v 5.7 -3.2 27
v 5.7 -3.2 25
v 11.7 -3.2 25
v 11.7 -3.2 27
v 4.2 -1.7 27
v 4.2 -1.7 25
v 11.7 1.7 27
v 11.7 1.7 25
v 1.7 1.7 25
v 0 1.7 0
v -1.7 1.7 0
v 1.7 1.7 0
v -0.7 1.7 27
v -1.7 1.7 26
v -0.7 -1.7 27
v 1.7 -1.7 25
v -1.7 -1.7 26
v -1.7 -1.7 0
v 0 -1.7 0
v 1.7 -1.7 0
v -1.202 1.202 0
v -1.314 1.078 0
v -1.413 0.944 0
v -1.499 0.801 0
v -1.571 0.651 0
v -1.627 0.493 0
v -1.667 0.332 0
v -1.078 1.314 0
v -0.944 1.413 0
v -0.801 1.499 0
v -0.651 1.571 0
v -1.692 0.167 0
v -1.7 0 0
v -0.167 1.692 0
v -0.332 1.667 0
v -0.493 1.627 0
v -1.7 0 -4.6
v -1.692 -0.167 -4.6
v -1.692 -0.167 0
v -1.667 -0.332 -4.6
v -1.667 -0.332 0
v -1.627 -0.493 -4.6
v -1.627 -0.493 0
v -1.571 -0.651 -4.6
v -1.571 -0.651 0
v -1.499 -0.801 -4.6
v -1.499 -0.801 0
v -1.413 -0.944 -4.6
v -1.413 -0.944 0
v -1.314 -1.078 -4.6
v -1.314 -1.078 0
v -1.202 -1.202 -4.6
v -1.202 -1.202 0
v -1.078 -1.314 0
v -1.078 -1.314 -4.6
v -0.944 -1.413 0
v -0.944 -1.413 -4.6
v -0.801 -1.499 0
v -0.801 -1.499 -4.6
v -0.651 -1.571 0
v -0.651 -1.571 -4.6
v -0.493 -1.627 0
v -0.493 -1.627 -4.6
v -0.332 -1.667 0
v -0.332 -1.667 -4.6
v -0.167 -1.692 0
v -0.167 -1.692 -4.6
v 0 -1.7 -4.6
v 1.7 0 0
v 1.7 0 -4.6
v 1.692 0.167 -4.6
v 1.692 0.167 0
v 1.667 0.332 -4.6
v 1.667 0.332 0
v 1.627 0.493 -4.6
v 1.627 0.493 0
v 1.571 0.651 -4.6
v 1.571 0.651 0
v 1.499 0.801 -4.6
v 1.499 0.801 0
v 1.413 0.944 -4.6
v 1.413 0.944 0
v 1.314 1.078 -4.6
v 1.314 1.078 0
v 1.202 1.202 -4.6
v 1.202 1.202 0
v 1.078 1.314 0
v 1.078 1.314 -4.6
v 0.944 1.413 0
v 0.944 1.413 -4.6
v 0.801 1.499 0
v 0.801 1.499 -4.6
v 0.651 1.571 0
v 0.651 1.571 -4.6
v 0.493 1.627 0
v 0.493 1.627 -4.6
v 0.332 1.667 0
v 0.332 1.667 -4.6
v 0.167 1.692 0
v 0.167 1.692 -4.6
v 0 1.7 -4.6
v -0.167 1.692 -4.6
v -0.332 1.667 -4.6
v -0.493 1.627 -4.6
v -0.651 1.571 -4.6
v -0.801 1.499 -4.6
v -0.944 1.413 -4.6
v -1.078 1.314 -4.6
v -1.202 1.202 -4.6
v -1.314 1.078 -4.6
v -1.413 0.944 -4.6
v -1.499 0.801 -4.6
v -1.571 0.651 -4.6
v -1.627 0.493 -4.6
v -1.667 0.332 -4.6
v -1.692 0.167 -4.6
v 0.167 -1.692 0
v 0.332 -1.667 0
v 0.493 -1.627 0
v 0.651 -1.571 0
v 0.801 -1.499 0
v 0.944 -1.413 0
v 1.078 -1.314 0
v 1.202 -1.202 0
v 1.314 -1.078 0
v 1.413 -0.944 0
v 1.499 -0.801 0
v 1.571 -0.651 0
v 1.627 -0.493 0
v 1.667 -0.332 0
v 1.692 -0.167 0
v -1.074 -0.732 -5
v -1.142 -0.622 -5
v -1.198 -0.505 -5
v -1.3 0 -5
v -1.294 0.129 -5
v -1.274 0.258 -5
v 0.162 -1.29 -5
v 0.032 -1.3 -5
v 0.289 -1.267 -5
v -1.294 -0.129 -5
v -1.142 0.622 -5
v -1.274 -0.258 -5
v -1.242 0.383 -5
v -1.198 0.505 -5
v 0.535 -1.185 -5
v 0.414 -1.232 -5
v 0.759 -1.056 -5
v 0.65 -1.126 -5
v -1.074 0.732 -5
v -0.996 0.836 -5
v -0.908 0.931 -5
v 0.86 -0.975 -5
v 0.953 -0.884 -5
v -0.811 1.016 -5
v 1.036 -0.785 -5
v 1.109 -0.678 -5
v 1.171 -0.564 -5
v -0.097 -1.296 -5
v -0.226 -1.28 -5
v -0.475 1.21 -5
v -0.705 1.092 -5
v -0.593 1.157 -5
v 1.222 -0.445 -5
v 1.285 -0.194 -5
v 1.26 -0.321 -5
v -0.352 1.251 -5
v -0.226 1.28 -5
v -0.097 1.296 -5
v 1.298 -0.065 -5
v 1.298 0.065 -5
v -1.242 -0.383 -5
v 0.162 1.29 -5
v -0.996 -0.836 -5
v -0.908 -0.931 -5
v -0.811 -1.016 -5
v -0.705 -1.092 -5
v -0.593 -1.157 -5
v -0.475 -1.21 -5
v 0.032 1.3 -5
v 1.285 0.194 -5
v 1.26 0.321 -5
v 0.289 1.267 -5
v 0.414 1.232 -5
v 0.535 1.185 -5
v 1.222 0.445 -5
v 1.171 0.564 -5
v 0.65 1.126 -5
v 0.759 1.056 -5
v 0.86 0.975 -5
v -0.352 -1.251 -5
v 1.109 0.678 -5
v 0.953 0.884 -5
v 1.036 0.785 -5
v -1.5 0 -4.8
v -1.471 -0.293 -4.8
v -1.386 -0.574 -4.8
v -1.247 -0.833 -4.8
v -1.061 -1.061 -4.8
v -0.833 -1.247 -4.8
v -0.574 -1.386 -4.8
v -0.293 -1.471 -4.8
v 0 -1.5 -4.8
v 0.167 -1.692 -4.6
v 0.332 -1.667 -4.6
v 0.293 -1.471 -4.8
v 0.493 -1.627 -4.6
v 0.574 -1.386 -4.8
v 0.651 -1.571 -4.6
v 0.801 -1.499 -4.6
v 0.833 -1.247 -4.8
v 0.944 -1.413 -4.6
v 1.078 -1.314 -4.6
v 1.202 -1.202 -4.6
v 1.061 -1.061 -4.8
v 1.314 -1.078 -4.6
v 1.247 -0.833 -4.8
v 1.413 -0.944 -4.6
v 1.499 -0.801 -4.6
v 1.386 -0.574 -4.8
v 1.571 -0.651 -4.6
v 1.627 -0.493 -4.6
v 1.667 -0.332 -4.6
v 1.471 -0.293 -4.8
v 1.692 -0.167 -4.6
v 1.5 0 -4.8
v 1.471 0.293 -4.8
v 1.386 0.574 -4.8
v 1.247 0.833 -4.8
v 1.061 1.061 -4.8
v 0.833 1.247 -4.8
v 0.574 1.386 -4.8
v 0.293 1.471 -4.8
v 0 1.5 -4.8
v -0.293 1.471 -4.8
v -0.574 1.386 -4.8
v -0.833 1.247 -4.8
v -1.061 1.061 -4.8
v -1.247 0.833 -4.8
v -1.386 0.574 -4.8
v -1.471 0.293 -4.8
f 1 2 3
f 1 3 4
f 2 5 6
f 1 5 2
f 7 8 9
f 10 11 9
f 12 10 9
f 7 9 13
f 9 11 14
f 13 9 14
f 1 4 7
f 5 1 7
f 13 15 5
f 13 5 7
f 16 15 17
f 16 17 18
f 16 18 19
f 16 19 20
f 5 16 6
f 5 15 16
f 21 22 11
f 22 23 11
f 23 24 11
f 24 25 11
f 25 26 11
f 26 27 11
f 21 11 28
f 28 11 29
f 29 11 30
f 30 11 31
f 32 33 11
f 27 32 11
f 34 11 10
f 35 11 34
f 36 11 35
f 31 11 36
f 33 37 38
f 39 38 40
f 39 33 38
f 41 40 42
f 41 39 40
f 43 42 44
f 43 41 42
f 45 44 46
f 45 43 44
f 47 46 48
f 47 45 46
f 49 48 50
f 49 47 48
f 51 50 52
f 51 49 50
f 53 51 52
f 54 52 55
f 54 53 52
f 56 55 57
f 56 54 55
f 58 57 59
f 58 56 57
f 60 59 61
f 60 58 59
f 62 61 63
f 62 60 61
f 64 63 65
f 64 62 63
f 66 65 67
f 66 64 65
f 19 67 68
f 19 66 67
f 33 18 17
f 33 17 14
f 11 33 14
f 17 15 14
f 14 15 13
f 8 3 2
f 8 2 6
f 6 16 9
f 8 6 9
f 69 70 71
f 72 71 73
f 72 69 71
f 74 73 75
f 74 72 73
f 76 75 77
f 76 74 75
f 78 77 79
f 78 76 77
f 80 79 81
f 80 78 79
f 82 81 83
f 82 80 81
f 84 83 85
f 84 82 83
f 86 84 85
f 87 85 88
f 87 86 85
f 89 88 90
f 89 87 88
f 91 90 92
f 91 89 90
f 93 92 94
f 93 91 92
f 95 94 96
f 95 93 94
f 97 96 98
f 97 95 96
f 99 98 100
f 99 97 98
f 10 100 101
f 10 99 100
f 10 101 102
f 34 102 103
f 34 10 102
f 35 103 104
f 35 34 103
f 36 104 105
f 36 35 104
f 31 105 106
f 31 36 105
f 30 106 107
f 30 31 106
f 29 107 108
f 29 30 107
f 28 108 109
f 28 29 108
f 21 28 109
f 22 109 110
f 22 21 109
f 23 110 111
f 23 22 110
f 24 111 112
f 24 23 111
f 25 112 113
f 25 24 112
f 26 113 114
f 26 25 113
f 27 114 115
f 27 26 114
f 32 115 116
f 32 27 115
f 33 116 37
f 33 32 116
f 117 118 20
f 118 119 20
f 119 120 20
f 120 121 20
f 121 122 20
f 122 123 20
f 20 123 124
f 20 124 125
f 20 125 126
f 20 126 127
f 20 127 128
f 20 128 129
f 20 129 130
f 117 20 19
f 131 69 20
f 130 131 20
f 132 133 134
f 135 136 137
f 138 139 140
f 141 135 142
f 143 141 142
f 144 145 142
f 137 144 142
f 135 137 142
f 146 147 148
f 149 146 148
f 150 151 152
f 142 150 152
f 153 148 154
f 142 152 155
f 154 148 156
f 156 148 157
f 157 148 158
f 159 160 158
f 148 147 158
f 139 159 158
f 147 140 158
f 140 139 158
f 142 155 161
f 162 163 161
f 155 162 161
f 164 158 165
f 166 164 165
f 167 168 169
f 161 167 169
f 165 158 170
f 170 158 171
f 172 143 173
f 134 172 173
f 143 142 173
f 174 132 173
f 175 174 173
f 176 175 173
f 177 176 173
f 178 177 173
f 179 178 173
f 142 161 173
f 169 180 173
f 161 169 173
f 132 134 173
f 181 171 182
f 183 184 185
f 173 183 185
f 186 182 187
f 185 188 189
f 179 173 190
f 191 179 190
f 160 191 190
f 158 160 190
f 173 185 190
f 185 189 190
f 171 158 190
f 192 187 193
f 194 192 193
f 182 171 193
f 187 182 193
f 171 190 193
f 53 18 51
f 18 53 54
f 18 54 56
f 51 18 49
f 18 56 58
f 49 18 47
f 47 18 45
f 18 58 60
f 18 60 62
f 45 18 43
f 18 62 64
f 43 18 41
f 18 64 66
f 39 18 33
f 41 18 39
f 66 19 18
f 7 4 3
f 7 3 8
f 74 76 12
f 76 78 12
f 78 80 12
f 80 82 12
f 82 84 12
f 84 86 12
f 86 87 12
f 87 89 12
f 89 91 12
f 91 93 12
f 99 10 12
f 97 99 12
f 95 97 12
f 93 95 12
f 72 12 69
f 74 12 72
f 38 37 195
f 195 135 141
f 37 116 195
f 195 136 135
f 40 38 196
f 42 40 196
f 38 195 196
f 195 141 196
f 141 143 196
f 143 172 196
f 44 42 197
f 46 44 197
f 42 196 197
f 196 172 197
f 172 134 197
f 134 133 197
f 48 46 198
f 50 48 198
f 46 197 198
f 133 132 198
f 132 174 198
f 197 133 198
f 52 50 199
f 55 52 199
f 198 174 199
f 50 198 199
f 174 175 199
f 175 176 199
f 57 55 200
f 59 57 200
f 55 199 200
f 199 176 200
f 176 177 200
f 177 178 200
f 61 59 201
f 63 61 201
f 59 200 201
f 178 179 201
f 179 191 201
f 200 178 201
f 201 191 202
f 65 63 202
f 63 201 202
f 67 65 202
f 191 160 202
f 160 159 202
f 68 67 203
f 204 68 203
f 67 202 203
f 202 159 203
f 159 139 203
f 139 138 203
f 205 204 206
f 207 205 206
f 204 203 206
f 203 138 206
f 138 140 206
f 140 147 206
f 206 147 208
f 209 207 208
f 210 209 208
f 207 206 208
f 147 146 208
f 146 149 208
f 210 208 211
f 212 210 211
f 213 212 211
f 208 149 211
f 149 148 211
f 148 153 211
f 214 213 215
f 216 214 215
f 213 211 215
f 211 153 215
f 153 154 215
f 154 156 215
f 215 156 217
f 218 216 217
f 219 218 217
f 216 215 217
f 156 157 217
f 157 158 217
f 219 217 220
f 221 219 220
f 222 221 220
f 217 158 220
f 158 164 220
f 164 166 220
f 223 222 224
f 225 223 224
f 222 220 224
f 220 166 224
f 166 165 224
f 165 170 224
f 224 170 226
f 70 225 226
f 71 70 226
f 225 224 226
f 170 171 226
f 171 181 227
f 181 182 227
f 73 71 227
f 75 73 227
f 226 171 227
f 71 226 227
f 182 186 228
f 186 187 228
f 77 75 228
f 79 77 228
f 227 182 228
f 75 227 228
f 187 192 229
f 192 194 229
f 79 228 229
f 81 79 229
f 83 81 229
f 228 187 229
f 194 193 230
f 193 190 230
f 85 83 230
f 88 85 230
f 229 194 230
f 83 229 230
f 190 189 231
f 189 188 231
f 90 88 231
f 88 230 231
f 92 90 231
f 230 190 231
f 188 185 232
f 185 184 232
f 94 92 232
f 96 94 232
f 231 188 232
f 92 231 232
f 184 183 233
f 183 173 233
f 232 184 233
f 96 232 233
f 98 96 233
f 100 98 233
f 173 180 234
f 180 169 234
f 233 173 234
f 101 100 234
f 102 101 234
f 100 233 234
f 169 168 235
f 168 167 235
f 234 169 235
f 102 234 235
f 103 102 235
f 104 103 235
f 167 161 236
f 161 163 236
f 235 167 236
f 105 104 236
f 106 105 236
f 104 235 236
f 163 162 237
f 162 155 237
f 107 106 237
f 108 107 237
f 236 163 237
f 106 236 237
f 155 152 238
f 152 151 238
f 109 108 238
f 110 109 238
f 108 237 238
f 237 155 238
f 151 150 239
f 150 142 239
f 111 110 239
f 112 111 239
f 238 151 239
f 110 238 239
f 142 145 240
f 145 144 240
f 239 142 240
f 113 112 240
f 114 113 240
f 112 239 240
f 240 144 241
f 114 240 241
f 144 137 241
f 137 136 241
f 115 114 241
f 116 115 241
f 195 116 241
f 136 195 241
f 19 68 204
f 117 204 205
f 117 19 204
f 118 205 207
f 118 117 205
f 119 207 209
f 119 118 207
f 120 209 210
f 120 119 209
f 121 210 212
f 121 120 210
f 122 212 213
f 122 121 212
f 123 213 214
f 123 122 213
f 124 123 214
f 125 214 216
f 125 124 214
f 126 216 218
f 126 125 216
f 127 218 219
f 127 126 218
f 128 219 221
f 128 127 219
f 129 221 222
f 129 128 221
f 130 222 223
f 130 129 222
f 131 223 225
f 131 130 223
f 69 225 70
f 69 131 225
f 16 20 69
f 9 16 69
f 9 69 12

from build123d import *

# Parameters (mm, degrees)
F0_W        = 3.4
F0_H        = 3.4
F1_DEPTH    = 27
F2_SIZE     = 1
F3_W        = 4.9
F3_H        = 2
F4_DEPTH    = 10
F5_T4_DEPTH = 22.5734639037
F7_DEPTH    = 5


# Not quite as in the source:
# - a fillet or chamfer that OpenCascade refuses, or shapes differently, is made with other operations: its cross-section is extruded or revolved along the edge and cut away or added


with BuildPart() as f1:
    # F0 (on Top) → F1 (new body)
    with BuildSketch(Plane.XY):
        Rectangle(F0_W, F0_H)
    extrude(amount=F1_DEPTH)

    # F2
    f2_edges = [f1.edges().sort_by_distance(p)[0] for p in [
        (-1.7, 0, 27),
    ]]
    chamfer(f2_edges, length=F2_SIZE)

    # F3 (on face) → F4 (join)
    with BuildSketch(Plane.YZ.offset(1.7)):
        with Locations((-0.75, 26)):
            Rectangle(F3_W, F3_H)
    extrude(amount=F4_DEPTH)

    # F5: chamfer of 4 on 1 edges, made by hand


with BuildPart() as f5_tool2:
    # F5_s3 → F5_t4 (new body)
    with BuildSketch(Plane.XY.offset(37.2867319519)):
        Polygon((1.7, 0.8), (5.7, -3.2), (1.7, -3.2), align=None)
    extrude(amount=-F5_T4_DEPTH)

    split(bisect_by=Plane.XZ.offset(1.7), keep=Keep.TOP)


with BuildPart() as f1_1:
    add(f1.part)

    # F5_t1: cut F5_tool2
    add(f5_tool2.part, mode=Mode.SUBTRACT)

    # F6 (on face) → F7 (join)
    with BuildSketch(Plane.XY):
        with BuildLine():
            ThreePointArc((0, -1.7), (1.202081528, -1.202081528), (1.7, 0))
            ThreePointArc((1.7, 0), (1.202081528, 1.202081528), (0, 1.7))
            ThreePointArc((0, 1.7), (-1.202081528, 1.202081528), (-1.7, 0))
            ThreePointArc((-1.7, 0), (-1.202081528, -1.202081528), (0, -1.7))
        make_face()
    extrude(amount=-F7_DEPTH)

    # F8: chamfer of 0.4 on 1 edges, made by hand

    # F8_s1 → F8_t2 (revolve, cut)
    with BuildSketch(Plane.XZ):
        Polygon((-1.7, -4.6), (-1.3, -5), (-1.7, -5), align=None)
    revolve(axis=Axis((0, 0, -5), (0, 0, 1)), mode=Mode.SUBTRACT)


solid = f1_1.part
